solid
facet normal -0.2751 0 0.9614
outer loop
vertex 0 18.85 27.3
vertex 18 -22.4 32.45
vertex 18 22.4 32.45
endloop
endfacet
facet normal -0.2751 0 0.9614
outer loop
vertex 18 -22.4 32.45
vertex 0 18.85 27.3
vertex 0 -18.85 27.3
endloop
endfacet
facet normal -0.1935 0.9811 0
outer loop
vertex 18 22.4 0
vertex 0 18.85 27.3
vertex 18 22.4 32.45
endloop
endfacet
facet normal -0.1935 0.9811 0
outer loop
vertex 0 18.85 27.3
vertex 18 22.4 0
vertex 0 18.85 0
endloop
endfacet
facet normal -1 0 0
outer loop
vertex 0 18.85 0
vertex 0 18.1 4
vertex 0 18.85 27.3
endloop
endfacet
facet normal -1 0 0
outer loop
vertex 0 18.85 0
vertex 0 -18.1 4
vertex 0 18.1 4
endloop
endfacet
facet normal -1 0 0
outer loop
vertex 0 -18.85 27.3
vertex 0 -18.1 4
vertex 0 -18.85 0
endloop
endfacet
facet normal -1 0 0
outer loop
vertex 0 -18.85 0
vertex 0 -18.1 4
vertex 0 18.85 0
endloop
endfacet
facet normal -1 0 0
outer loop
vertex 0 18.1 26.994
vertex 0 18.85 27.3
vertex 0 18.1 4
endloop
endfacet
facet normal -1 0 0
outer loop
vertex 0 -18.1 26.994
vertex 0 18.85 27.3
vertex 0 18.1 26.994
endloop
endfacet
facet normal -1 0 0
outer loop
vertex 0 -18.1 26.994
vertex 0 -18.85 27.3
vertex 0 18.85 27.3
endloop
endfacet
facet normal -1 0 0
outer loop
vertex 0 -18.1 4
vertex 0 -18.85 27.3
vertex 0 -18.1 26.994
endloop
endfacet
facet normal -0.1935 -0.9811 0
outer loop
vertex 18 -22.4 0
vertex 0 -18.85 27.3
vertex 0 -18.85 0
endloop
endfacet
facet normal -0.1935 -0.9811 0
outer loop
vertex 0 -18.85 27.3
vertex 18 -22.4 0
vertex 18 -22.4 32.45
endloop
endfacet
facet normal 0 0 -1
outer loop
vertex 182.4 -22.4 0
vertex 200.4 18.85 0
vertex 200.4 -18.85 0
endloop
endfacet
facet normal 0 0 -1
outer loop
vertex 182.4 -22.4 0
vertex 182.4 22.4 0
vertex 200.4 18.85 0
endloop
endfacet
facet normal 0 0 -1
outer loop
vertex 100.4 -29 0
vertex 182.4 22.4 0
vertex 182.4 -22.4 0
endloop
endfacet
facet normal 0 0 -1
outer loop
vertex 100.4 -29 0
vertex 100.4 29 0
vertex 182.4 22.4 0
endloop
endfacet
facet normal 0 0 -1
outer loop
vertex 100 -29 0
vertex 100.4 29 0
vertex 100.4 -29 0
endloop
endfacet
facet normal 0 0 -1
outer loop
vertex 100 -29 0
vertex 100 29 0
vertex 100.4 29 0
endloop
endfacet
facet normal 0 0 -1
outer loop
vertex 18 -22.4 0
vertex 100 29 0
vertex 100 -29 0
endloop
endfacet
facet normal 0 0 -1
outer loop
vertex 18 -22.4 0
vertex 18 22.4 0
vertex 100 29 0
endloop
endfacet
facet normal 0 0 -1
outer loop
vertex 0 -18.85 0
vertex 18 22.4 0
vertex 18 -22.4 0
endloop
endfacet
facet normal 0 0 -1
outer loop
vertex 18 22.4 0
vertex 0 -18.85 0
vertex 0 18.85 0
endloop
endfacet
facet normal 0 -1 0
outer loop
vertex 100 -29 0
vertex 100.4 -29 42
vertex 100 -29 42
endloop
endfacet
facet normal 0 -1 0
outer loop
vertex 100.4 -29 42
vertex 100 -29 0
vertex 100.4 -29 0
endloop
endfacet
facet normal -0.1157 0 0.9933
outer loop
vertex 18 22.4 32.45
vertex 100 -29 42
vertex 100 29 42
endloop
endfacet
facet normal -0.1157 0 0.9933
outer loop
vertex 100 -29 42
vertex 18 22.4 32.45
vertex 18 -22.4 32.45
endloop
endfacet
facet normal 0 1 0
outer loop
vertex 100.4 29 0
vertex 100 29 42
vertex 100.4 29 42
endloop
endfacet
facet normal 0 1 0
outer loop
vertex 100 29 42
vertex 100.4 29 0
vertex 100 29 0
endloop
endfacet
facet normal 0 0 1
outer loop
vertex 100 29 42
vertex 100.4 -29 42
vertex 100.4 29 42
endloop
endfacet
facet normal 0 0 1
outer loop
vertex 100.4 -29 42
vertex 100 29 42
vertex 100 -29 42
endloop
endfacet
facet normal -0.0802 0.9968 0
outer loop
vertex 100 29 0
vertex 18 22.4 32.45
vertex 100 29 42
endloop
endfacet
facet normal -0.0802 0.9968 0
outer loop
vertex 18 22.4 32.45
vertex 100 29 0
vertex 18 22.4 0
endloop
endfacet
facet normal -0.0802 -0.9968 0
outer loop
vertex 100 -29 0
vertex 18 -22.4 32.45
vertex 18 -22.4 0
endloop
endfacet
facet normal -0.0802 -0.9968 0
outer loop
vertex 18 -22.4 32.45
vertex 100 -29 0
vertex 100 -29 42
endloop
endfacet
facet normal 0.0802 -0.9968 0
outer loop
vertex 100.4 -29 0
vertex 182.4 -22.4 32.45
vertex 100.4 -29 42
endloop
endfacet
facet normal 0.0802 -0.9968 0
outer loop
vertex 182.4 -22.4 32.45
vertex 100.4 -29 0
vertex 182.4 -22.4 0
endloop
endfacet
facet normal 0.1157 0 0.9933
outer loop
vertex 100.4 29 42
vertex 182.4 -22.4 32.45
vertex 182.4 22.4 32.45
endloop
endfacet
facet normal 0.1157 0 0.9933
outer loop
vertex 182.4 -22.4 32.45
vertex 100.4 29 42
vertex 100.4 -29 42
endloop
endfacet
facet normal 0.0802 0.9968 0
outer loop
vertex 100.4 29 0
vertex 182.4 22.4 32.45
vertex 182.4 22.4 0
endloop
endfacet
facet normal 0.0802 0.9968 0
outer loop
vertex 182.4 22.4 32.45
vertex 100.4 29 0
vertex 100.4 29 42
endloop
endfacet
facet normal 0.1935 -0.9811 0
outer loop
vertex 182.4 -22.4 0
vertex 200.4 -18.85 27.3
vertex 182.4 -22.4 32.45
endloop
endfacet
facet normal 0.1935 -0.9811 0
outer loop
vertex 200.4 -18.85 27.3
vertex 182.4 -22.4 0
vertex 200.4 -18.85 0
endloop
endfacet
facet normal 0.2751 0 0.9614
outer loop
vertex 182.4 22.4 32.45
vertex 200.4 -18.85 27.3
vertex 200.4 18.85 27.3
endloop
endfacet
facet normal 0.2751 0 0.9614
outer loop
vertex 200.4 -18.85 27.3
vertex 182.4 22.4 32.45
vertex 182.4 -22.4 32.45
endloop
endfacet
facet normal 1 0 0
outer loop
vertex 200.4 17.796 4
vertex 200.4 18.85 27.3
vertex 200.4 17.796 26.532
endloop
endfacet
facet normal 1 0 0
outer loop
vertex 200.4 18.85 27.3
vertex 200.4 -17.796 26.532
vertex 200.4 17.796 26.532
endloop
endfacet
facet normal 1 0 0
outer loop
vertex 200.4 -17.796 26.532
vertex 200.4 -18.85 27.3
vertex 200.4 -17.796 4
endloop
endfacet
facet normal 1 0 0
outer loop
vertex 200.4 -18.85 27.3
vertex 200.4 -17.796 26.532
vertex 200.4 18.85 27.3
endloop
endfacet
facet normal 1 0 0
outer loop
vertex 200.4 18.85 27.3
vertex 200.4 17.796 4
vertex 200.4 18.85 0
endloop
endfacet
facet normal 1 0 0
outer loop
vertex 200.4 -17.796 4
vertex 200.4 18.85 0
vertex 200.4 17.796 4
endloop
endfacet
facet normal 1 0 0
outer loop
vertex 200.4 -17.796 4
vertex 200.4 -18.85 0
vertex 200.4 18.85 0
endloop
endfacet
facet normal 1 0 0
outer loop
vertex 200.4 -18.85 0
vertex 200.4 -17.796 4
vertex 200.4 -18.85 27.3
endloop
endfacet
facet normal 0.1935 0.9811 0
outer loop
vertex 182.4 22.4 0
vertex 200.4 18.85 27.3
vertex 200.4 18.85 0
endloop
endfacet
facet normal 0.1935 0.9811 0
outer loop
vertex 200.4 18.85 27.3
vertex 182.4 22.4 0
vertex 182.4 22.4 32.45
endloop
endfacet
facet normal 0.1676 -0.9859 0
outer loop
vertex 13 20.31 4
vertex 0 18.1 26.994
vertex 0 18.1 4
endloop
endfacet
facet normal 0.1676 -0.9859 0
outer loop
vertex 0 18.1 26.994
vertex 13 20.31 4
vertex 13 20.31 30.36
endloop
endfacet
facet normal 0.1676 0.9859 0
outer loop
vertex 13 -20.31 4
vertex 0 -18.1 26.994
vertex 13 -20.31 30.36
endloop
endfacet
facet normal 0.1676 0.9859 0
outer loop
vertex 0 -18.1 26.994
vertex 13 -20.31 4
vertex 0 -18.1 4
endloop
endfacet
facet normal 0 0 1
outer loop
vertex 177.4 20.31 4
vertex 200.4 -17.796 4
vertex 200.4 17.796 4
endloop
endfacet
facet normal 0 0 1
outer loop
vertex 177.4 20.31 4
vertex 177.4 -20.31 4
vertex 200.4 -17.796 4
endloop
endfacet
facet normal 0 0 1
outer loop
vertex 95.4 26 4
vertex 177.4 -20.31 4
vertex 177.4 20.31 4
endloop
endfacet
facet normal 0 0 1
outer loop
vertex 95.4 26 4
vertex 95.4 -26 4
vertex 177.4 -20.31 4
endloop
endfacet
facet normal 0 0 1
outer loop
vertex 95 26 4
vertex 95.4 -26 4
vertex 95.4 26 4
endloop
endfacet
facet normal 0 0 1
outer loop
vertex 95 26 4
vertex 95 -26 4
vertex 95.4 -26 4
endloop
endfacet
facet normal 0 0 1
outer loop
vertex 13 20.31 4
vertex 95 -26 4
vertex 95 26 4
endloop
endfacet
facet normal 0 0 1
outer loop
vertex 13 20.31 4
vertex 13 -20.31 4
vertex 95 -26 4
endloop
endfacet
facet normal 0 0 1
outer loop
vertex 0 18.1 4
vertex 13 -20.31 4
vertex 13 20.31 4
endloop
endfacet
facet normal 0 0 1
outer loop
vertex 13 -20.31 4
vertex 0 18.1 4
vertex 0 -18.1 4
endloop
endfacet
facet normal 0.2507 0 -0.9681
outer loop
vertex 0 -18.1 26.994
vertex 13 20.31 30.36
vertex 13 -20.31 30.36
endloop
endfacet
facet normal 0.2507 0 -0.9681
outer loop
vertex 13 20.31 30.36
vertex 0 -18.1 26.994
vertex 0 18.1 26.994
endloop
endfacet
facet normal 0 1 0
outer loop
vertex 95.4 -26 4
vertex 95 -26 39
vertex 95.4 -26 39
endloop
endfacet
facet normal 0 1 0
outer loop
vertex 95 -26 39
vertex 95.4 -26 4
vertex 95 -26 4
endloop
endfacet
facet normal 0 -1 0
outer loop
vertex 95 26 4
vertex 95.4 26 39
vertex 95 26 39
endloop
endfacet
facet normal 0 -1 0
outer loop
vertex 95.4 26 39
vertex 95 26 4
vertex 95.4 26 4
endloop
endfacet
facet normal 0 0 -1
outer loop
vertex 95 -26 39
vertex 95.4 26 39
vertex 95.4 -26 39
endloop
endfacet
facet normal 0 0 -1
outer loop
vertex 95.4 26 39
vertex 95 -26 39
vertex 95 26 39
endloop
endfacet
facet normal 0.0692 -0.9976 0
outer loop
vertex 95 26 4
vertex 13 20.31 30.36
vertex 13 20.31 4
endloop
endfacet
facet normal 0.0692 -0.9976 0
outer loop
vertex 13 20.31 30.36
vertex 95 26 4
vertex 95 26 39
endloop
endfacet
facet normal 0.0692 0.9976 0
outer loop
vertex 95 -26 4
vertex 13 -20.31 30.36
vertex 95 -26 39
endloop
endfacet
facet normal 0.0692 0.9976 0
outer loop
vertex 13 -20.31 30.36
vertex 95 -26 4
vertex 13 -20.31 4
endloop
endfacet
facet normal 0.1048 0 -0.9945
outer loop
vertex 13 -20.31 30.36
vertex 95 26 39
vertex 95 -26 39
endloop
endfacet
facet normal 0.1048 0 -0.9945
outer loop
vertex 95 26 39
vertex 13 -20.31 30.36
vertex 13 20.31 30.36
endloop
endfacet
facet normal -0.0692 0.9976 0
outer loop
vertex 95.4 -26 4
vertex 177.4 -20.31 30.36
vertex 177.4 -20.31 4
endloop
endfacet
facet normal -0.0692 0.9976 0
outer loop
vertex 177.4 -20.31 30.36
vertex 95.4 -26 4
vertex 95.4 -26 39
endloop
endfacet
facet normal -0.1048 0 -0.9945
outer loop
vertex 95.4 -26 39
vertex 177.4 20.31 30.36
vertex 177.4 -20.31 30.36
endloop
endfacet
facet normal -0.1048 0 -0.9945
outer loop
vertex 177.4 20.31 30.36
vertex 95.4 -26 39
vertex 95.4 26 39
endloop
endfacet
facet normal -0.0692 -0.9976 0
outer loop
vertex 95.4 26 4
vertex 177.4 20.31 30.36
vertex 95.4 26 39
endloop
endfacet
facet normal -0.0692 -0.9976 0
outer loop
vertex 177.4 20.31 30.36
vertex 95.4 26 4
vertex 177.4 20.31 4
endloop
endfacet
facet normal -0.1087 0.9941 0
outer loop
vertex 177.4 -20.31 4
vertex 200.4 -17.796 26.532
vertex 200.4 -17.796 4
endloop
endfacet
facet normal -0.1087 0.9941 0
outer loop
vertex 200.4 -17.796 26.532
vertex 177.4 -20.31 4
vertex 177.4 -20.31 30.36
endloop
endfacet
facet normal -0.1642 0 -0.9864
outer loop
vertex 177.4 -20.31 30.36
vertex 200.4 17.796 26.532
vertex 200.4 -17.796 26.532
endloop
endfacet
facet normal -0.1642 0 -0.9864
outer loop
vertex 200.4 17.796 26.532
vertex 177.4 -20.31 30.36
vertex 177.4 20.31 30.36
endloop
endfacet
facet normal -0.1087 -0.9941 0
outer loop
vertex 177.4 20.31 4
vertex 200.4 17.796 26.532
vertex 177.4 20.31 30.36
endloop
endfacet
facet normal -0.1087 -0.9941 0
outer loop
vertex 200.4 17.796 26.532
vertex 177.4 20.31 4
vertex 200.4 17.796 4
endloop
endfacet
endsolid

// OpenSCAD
$fn = 32;

// ----------------------------------------------------------------------
// Faired channel: 200 x 58 x 42 mm, 3 mm walls, faired ends
// ----------------------------------------------------------------------

// --- parameters (mm) ---
length = 200;             // channel length
width = 58;               // channel width at mid length
height = 42;              // channel height at mid length
wall = 3;                 // side wall thickness
floor_t = 4;              // floor thickness
end_w = 37.7;             // faired end width
end_h = 27.3;             // faired end height

difference() {
  union() {
    hull() {
      translate([0, -18.85, 0]) cube([0.4, 37.7, 27.3]);
      translate([18, -22.4, 0]) cube([0.4, 44.8, 32.45]);
    }
    hull() {
      translate([18, -22.4, 0]) cube([0.4, 44.8, 32.45]);
      translate([100, -29, 0]) cube([0.4, 58, 42]);
    }
    hull() {
      translate([100, -29, 0]) cube([0.4, 58, 42]);
      translate([182, -22.4, 0]) cube([0.4, 44.8, 32.45]);
    }
    hull() {
      translate([182, -22.4, 0]) cube([0.4, 44.8, 32.45]);
      translate([200, -18.85, 0]) cube([0.4, 37.7, 27.3]);
    }
  }
  /* cavity, 5 mm proud of both ends so the ports are cut clean */
  hull() {
    translate([-5, -17.25, 4]) cube([0.4, 34.5, 21.7]);
    translate([13, -20.31, 4]) cube([0.4, 40.62, 26.36]);
  }
  hull() {
    translate([13, -20.31, 4]) cube([0.4, 40.62, 26.36]);
    translate([95, -26, 4]) cube([0.4, 52, 35]);
  }
  hull() {
    translate([95, -26, 4]) cube([0.4, 52, 35]);
    translate([177, -20.31, 4]) cube([0.4, 40.62, 26.36]);
  }
  hull() {
    translate([177, -20.31, 4]) cube([0.4, 40.62, 26.36]);
    translate([205, -17.25, 4]) cube([0.4, 34.5, 21.7]);
  }
}
